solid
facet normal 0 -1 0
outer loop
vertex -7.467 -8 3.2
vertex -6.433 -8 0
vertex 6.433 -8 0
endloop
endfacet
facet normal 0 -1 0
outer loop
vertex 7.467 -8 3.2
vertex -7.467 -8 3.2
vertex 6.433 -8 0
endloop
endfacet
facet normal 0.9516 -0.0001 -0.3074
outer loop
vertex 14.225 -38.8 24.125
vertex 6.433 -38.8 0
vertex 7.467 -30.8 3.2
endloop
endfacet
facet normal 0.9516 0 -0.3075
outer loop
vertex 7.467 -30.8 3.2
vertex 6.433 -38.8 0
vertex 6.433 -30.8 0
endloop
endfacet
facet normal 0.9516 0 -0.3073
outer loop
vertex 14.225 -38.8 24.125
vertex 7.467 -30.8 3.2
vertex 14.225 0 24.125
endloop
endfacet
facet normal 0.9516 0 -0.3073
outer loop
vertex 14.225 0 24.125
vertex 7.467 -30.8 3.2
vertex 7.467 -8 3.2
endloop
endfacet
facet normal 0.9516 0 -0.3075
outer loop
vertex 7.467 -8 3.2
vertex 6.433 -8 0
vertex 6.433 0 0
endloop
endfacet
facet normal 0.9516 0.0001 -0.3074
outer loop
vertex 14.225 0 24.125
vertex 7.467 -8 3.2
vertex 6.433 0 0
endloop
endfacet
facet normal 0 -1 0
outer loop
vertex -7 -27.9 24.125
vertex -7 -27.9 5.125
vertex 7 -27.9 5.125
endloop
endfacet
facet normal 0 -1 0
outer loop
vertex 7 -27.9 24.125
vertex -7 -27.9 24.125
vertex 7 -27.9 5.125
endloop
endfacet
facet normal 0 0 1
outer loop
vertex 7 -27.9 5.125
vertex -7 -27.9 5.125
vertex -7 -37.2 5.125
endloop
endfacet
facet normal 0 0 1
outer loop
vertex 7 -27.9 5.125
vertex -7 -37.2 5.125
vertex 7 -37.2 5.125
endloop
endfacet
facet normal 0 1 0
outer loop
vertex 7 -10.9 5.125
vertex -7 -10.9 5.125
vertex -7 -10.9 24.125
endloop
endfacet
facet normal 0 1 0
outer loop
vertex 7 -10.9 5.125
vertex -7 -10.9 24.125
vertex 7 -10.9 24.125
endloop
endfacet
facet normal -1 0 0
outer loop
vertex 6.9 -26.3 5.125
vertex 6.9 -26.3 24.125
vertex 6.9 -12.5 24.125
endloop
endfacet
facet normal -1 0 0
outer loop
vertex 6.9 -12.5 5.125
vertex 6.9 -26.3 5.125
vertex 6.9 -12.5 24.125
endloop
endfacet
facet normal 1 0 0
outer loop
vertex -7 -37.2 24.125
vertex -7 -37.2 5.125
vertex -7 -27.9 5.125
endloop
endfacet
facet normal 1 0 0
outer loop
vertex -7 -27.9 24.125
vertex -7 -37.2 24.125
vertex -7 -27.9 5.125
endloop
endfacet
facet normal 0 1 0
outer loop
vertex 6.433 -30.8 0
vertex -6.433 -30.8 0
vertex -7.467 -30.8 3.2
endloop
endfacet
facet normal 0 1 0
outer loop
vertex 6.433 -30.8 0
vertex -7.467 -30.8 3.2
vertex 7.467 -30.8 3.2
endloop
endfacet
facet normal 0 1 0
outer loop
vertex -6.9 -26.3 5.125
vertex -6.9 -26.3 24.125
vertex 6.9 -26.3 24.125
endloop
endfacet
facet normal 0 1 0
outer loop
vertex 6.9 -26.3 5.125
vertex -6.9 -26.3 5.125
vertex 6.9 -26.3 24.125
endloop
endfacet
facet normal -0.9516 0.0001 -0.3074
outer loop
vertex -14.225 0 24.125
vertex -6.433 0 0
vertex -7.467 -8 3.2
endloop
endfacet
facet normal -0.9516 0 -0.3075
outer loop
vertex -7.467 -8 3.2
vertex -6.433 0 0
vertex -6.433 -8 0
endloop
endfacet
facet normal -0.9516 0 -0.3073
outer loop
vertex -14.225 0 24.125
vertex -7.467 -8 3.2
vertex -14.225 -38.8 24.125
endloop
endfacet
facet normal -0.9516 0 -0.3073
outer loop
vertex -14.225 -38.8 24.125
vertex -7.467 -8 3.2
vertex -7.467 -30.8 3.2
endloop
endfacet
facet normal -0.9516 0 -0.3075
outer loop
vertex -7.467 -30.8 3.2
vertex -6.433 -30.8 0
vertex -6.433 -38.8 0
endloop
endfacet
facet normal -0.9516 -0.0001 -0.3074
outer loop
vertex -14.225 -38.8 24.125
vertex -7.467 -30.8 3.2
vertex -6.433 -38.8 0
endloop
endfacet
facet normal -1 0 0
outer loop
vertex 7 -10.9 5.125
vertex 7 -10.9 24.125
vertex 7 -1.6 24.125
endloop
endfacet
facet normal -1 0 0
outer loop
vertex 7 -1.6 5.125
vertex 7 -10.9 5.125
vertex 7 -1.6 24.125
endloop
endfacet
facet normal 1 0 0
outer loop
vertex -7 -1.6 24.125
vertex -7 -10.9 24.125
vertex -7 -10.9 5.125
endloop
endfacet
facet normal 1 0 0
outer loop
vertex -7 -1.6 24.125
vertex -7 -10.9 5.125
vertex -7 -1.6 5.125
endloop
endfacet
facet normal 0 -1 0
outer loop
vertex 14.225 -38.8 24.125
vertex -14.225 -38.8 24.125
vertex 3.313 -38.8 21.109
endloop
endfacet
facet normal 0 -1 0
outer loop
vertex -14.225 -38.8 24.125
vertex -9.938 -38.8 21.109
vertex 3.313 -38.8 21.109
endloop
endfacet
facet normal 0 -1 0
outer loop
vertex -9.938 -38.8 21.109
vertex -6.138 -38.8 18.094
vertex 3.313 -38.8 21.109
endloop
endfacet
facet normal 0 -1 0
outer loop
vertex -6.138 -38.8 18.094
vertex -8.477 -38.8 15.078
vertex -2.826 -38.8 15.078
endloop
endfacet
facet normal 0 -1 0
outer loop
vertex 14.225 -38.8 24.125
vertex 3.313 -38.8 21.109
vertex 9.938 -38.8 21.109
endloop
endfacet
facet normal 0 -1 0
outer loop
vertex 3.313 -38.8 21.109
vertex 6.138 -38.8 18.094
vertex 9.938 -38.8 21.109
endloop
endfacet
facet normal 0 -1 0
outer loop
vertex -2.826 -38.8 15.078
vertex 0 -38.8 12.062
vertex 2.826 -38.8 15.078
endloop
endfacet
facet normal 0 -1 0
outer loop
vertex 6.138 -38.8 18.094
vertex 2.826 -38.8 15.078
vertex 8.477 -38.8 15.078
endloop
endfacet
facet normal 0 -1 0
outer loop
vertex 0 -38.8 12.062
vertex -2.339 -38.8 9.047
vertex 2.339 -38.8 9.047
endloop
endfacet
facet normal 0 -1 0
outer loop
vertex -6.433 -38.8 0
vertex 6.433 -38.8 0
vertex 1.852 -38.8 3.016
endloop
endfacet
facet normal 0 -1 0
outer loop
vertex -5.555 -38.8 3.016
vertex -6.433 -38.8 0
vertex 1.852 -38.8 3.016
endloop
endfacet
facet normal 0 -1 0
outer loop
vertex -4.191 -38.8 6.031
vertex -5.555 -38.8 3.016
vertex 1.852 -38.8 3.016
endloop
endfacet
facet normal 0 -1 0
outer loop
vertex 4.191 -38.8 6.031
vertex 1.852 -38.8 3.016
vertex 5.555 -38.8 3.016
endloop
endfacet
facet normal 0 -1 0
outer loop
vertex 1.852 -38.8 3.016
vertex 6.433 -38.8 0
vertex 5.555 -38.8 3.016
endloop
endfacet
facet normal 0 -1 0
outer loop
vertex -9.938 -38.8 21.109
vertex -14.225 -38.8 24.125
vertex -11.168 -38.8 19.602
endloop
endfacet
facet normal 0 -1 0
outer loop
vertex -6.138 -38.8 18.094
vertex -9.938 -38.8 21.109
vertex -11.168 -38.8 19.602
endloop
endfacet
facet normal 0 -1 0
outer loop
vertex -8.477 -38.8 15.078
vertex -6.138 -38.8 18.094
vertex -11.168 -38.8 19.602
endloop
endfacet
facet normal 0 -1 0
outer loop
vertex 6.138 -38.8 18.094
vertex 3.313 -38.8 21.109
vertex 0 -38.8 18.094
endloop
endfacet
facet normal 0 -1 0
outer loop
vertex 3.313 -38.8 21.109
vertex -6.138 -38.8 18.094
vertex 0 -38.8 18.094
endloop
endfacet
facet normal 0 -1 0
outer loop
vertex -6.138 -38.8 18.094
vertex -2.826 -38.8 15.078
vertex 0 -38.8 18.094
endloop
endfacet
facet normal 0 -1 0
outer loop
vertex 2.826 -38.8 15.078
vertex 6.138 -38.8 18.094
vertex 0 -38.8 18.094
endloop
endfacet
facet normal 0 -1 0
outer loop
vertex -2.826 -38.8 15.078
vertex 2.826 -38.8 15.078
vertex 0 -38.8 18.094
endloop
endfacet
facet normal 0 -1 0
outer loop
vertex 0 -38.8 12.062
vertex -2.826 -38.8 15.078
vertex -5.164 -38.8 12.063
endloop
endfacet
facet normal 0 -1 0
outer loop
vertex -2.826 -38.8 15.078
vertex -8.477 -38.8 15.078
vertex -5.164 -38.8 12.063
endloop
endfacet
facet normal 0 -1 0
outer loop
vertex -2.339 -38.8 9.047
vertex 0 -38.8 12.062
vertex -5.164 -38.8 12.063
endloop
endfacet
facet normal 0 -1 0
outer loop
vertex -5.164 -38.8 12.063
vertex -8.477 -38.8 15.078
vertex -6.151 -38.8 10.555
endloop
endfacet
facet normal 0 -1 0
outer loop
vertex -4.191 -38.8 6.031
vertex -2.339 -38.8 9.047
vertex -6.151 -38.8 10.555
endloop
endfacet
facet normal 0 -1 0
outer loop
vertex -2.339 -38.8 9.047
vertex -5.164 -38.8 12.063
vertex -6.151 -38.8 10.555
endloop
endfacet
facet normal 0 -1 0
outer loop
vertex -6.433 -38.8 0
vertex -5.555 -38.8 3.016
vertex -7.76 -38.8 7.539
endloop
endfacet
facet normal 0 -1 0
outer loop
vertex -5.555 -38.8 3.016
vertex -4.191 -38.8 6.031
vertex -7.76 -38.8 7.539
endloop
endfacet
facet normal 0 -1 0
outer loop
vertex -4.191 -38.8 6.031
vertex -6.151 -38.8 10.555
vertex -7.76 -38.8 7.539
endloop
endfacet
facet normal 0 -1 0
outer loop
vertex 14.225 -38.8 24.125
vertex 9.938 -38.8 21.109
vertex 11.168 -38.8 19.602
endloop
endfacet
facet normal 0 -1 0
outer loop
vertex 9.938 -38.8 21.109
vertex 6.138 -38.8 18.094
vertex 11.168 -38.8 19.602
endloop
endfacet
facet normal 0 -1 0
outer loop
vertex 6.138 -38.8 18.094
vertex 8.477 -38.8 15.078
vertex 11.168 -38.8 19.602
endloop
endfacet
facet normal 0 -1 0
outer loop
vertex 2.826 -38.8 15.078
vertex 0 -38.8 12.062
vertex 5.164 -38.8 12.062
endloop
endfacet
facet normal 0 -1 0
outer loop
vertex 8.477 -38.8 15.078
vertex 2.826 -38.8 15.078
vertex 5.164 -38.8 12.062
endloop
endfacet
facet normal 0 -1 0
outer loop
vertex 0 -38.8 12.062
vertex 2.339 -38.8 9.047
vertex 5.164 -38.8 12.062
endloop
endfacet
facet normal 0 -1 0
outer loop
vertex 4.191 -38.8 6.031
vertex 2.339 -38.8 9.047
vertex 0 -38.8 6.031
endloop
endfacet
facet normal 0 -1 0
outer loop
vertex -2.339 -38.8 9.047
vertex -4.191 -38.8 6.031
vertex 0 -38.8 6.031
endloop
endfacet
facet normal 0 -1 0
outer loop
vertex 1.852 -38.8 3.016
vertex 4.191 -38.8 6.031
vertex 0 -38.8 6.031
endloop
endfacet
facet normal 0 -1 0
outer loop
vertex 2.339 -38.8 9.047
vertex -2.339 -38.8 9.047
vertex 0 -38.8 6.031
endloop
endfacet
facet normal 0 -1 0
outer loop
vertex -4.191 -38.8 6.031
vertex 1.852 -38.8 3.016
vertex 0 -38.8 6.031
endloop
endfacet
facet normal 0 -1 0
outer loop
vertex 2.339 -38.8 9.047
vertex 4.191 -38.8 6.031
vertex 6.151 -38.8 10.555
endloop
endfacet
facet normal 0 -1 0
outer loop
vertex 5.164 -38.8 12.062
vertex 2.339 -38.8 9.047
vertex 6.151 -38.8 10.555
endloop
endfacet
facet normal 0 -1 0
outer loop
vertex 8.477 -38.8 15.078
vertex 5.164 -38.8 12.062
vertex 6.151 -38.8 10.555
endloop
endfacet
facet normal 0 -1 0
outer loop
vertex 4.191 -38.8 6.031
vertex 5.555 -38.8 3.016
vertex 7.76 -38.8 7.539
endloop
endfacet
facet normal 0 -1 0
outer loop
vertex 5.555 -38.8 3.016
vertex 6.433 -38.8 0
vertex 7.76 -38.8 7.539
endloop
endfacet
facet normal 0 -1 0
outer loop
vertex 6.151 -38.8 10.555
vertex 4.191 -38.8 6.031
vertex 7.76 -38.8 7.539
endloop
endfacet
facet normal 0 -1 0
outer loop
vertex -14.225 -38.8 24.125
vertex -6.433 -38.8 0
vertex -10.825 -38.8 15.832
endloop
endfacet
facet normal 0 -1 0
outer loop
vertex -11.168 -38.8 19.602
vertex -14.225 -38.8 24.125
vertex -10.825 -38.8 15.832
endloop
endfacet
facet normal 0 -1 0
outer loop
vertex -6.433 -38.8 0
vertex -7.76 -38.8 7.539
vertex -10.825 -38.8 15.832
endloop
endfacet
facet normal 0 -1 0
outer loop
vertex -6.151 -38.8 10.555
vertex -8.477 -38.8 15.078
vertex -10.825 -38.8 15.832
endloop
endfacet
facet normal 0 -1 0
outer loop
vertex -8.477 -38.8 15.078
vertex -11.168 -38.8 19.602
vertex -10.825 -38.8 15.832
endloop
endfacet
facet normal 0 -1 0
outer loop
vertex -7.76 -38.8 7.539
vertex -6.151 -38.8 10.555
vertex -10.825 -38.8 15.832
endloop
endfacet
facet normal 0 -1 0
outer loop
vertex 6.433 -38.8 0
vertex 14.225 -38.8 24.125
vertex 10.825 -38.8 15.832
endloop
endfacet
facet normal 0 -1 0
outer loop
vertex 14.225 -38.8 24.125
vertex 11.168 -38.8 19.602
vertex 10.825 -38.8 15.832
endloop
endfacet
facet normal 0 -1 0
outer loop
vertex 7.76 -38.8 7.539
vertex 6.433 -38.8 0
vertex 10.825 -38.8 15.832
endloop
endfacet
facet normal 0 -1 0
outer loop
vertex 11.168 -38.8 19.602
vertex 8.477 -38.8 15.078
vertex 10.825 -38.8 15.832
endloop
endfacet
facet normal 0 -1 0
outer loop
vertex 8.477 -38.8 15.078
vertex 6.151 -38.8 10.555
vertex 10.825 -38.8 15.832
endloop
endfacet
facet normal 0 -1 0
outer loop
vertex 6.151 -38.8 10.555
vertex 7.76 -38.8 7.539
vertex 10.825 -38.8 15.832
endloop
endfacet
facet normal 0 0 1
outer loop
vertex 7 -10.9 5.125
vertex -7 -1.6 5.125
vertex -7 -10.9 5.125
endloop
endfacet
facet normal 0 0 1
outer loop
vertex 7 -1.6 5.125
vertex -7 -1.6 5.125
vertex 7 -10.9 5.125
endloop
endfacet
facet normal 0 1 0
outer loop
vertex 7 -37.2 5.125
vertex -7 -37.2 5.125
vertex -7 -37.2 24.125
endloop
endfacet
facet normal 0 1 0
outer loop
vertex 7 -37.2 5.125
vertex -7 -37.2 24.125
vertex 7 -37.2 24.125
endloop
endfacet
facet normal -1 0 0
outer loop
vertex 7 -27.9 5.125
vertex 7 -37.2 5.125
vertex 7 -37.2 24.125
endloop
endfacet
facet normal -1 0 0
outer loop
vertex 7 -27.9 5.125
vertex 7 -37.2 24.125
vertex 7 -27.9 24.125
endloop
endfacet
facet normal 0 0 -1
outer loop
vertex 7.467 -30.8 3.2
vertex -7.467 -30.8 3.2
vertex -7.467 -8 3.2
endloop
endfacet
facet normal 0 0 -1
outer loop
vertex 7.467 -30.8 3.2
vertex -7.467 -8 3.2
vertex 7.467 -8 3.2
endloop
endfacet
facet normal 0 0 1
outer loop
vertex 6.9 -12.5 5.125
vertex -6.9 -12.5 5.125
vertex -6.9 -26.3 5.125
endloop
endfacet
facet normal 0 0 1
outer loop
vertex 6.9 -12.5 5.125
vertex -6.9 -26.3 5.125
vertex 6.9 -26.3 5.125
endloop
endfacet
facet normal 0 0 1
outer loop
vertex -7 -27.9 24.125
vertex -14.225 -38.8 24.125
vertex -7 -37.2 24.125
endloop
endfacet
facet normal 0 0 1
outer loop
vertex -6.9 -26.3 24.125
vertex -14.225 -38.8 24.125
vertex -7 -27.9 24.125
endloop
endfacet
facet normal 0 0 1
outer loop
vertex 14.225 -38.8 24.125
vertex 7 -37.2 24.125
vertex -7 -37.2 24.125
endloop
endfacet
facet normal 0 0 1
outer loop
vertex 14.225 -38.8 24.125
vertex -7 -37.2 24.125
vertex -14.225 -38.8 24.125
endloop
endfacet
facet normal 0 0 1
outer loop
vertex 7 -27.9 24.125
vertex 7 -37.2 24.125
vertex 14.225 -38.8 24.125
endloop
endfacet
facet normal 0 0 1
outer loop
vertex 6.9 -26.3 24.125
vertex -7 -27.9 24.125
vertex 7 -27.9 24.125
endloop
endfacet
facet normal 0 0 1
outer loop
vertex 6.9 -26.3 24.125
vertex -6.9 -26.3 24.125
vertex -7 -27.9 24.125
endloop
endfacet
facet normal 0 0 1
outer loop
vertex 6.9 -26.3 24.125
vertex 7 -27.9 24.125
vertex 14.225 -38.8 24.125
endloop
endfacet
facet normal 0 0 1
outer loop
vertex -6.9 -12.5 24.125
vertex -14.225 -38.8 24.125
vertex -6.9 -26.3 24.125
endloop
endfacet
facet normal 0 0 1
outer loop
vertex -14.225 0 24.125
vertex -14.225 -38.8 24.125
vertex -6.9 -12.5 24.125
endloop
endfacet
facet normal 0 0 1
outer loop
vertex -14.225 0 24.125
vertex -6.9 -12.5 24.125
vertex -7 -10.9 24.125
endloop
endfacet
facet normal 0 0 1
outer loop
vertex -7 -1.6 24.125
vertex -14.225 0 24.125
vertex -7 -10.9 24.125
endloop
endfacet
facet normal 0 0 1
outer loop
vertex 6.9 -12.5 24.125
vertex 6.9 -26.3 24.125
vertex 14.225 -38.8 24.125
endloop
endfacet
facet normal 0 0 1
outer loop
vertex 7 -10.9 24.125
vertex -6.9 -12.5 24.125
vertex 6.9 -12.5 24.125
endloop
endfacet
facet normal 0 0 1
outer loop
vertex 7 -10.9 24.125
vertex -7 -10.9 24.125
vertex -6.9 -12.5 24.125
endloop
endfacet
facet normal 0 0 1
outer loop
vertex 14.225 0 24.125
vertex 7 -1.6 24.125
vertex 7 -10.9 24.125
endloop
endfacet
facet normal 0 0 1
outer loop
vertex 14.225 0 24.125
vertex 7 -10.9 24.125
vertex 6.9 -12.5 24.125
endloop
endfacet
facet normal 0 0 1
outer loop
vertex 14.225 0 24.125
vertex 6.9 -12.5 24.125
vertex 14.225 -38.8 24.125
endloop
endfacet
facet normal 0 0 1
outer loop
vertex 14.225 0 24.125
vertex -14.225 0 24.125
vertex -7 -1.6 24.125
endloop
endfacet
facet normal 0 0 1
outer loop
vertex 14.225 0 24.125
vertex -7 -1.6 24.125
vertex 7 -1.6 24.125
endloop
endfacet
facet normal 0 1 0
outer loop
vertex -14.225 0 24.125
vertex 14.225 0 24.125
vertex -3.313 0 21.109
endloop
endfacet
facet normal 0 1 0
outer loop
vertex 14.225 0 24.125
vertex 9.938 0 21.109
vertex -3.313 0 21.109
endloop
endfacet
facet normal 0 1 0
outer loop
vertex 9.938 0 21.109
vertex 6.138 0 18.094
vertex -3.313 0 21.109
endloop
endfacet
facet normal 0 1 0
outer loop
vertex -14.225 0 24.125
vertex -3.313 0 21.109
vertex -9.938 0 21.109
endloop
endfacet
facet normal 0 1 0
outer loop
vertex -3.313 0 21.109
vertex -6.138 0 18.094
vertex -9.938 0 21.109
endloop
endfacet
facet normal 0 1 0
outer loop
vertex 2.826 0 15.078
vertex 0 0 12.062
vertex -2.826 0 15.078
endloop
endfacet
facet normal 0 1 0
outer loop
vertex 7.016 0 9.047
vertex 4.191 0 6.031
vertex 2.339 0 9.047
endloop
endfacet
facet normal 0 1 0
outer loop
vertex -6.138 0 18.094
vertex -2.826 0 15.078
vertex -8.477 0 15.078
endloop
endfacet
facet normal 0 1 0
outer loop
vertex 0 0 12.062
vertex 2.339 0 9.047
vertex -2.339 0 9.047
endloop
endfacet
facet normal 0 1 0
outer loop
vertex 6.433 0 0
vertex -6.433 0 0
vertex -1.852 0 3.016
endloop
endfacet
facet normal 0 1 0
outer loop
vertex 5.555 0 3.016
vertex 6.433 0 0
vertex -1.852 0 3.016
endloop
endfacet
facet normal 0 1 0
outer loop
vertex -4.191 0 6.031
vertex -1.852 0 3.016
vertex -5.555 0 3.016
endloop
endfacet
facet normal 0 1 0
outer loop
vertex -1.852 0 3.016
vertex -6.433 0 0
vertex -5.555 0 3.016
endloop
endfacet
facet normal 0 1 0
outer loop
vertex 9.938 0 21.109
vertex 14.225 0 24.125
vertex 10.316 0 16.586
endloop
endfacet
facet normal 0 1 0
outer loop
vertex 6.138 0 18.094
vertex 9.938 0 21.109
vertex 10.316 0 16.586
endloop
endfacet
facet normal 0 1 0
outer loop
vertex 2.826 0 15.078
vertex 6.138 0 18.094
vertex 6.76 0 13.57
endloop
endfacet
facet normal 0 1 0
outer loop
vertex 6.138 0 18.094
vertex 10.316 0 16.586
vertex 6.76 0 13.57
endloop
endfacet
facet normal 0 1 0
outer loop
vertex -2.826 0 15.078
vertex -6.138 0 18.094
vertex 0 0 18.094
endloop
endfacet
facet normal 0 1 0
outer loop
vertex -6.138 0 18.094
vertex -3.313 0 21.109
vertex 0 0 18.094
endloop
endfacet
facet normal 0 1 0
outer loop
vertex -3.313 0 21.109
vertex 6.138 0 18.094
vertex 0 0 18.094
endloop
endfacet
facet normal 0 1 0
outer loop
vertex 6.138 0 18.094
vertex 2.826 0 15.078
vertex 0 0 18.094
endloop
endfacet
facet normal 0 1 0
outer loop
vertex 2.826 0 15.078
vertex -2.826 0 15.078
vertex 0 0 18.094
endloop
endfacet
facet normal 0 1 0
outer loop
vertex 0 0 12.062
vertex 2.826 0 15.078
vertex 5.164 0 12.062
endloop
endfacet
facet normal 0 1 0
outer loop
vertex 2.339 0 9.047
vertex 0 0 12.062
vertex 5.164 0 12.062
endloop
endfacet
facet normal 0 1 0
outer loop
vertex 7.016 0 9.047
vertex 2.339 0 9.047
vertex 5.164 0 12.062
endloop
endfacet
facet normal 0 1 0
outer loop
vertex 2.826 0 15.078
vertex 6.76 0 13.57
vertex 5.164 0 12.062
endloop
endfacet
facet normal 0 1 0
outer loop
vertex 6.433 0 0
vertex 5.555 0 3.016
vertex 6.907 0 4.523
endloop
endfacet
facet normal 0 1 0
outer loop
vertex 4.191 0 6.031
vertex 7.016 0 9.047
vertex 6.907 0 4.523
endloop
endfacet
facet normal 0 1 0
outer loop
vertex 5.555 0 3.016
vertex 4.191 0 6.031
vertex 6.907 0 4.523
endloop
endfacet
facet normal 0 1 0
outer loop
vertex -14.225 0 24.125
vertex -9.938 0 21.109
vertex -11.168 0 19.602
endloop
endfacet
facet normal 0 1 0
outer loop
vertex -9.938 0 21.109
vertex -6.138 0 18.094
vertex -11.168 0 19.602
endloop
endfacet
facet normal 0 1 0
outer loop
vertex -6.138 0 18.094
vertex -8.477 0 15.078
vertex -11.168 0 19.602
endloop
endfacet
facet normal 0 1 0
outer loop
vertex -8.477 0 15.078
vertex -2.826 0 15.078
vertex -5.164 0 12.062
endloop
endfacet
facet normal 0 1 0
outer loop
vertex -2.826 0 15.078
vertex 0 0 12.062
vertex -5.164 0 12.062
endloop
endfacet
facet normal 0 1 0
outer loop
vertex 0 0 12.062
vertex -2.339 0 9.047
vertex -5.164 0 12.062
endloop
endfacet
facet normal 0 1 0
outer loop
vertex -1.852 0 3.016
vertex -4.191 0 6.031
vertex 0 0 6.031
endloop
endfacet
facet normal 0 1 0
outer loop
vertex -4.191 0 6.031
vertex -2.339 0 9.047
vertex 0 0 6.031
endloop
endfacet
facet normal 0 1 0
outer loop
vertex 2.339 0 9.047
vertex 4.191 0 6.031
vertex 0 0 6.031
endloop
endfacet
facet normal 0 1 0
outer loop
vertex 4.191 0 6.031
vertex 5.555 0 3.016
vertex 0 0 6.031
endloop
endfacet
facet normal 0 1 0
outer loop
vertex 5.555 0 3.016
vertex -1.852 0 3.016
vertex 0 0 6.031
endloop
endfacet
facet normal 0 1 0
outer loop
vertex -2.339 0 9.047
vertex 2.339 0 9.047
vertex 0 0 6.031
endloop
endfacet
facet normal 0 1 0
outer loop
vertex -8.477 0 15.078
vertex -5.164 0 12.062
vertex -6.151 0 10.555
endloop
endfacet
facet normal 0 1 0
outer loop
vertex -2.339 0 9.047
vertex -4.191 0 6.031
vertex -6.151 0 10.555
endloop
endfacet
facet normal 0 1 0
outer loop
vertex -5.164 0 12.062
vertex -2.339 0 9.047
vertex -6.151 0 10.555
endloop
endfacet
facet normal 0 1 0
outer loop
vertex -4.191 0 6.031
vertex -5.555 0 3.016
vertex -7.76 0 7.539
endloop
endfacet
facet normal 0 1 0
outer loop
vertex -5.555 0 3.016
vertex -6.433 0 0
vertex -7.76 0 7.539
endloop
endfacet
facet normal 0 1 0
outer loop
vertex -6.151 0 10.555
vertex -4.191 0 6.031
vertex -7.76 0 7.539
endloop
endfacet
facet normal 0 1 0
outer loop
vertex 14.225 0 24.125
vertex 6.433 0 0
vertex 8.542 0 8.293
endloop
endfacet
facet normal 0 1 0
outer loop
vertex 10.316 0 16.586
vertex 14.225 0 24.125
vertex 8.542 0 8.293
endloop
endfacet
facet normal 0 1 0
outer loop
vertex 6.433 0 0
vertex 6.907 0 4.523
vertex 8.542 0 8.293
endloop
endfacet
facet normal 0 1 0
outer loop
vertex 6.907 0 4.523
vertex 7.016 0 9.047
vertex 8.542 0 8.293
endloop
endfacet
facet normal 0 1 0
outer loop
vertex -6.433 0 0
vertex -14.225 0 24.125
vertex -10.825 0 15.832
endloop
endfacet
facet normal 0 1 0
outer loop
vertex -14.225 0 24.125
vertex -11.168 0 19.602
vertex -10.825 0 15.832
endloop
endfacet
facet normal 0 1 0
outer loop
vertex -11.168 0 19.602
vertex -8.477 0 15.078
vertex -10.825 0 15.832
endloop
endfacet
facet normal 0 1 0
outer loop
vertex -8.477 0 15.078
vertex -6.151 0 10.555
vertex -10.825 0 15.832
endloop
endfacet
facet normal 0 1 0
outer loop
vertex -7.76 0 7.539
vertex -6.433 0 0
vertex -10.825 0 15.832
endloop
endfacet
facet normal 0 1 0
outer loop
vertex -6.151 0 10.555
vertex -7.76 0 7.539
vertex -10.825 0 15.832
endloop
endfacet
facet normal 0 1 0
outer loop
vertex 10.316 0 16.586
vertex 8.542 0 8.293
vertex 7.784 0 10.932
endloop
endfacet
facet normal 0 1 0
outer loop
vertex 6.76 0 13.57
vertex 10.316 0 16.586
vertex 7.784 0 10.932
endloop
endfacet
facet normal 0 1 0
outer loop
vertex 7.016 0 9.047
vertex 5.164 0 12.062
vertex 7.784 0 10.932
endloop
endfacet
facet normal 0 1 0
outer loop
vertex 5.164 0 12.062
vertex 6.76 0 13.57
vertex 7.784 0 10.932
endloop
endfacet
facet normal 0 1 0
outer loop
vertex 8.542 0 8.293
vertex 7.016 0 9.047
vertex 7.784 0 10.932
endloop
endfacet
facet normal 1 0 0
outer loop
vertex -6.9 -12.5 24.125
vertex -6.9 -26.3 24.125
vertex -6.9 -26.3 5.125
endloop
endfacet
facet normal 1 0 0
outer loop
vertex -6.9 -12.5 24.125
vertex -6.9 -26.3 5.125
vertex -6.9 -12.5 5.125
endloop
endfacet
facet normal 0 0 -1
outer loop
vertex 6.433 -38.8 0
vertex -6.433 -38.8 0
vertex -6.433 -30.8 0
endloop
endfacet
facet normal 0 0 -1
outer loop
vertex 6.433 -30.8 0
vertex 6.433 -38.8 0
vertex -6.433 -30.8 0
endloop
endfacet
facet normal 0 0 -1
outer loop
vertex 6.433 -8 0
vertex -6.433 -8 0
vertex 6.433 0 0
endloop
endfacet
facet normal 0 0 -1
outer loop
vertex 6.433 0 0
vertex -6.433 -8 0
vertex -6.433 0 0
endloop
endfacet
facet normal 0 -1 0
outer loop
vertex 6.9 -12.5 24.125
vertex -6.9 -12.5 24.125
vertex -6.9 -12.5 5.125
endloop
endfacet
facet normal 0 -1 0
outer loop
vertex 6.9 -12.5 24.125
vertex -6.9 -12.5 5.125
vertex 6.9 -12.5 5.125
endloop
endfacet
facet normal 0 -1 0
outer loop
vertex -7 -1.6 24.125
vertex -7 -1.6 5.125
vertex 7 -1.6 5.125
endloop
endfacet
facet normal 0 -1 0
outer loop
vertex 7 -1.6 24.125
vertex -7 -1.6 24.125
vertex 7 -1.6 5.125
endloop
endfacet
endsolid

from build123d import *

# Parameters (mm, degrees)
F1_W      = 36.2
F1_H      = 38.8
F2_W      = 12.866667
F2_H      = 38.8
F3_FACE_W = 36.2
F3_FACE_H = 38.8
F4_DEPTH  = 12
F5_W      = 13.8
F5_H      = 13.8
F6_DEPTH  = 31
F7_W      = 20
F7_H      = 22.8
F8_DEPTH  = 3.2
F9_W      = 14
F9_H      = 9.3
F10_DEPTH = 31


with BuildPart() as f3:
    # F1 (on offset) → F3 section 0
    with BuildSketch(Plane.XY.offset(36.125)):
        with Locations((0, -19.4)):
            Rectangle(F1_W, F1_H)
    # F2 (on Top) → F3 section 1
    with BuildSketch(Plane.XY):
        with Locations((-3.3e-05, -19.4)):
            Rectangle(F2_W, F2_H)
    loft()

    # F3_face (on face) → F4 (cut)
    with BuildSketch(Plane(origin=(0, -19.4, 36.125), x_dir=(1, 0, 0), z_dir=(0, 0, 1))):
        Rectangle(F3_FACE_W, F3_FACE_H)
    extrude(amount=-F4_DEPTH, mode=Mode.SUBTRACT)

    # F5 (on offset) → F6 (cut)
    with BuildSketch(Plane.XY.offset(36.125)):
        with Locations((0, -19.4)):
            Rectangle(F5_W, F5_H)
    extrude(amount=-F6_DEPTH, mode=Mode.SUBTRACT)

    # F7 (on Top) → F8 (cut)
    with BuildSketch(Plane.XY):
        with Locations((0, -19.4)):
            Rectangle(F7_W, F7_H)
    extrude(amount=F8_DEPTH, mode=Mode.SUBTRACT)

    # F9 (on offset) → F10 (cut)
    with BuildSketch(Plane.XY.offset(36.125)):
        with Locations((0, -6.25)):
            Rectangle(F9_W, F9_H)
        with Locations((0, -32.55)):
            Rectangle(F9_W, F9_H)
    extrude(amount=-F10_DEPTH, mode=Mode.SUBTRACT)


solid = f3.part
